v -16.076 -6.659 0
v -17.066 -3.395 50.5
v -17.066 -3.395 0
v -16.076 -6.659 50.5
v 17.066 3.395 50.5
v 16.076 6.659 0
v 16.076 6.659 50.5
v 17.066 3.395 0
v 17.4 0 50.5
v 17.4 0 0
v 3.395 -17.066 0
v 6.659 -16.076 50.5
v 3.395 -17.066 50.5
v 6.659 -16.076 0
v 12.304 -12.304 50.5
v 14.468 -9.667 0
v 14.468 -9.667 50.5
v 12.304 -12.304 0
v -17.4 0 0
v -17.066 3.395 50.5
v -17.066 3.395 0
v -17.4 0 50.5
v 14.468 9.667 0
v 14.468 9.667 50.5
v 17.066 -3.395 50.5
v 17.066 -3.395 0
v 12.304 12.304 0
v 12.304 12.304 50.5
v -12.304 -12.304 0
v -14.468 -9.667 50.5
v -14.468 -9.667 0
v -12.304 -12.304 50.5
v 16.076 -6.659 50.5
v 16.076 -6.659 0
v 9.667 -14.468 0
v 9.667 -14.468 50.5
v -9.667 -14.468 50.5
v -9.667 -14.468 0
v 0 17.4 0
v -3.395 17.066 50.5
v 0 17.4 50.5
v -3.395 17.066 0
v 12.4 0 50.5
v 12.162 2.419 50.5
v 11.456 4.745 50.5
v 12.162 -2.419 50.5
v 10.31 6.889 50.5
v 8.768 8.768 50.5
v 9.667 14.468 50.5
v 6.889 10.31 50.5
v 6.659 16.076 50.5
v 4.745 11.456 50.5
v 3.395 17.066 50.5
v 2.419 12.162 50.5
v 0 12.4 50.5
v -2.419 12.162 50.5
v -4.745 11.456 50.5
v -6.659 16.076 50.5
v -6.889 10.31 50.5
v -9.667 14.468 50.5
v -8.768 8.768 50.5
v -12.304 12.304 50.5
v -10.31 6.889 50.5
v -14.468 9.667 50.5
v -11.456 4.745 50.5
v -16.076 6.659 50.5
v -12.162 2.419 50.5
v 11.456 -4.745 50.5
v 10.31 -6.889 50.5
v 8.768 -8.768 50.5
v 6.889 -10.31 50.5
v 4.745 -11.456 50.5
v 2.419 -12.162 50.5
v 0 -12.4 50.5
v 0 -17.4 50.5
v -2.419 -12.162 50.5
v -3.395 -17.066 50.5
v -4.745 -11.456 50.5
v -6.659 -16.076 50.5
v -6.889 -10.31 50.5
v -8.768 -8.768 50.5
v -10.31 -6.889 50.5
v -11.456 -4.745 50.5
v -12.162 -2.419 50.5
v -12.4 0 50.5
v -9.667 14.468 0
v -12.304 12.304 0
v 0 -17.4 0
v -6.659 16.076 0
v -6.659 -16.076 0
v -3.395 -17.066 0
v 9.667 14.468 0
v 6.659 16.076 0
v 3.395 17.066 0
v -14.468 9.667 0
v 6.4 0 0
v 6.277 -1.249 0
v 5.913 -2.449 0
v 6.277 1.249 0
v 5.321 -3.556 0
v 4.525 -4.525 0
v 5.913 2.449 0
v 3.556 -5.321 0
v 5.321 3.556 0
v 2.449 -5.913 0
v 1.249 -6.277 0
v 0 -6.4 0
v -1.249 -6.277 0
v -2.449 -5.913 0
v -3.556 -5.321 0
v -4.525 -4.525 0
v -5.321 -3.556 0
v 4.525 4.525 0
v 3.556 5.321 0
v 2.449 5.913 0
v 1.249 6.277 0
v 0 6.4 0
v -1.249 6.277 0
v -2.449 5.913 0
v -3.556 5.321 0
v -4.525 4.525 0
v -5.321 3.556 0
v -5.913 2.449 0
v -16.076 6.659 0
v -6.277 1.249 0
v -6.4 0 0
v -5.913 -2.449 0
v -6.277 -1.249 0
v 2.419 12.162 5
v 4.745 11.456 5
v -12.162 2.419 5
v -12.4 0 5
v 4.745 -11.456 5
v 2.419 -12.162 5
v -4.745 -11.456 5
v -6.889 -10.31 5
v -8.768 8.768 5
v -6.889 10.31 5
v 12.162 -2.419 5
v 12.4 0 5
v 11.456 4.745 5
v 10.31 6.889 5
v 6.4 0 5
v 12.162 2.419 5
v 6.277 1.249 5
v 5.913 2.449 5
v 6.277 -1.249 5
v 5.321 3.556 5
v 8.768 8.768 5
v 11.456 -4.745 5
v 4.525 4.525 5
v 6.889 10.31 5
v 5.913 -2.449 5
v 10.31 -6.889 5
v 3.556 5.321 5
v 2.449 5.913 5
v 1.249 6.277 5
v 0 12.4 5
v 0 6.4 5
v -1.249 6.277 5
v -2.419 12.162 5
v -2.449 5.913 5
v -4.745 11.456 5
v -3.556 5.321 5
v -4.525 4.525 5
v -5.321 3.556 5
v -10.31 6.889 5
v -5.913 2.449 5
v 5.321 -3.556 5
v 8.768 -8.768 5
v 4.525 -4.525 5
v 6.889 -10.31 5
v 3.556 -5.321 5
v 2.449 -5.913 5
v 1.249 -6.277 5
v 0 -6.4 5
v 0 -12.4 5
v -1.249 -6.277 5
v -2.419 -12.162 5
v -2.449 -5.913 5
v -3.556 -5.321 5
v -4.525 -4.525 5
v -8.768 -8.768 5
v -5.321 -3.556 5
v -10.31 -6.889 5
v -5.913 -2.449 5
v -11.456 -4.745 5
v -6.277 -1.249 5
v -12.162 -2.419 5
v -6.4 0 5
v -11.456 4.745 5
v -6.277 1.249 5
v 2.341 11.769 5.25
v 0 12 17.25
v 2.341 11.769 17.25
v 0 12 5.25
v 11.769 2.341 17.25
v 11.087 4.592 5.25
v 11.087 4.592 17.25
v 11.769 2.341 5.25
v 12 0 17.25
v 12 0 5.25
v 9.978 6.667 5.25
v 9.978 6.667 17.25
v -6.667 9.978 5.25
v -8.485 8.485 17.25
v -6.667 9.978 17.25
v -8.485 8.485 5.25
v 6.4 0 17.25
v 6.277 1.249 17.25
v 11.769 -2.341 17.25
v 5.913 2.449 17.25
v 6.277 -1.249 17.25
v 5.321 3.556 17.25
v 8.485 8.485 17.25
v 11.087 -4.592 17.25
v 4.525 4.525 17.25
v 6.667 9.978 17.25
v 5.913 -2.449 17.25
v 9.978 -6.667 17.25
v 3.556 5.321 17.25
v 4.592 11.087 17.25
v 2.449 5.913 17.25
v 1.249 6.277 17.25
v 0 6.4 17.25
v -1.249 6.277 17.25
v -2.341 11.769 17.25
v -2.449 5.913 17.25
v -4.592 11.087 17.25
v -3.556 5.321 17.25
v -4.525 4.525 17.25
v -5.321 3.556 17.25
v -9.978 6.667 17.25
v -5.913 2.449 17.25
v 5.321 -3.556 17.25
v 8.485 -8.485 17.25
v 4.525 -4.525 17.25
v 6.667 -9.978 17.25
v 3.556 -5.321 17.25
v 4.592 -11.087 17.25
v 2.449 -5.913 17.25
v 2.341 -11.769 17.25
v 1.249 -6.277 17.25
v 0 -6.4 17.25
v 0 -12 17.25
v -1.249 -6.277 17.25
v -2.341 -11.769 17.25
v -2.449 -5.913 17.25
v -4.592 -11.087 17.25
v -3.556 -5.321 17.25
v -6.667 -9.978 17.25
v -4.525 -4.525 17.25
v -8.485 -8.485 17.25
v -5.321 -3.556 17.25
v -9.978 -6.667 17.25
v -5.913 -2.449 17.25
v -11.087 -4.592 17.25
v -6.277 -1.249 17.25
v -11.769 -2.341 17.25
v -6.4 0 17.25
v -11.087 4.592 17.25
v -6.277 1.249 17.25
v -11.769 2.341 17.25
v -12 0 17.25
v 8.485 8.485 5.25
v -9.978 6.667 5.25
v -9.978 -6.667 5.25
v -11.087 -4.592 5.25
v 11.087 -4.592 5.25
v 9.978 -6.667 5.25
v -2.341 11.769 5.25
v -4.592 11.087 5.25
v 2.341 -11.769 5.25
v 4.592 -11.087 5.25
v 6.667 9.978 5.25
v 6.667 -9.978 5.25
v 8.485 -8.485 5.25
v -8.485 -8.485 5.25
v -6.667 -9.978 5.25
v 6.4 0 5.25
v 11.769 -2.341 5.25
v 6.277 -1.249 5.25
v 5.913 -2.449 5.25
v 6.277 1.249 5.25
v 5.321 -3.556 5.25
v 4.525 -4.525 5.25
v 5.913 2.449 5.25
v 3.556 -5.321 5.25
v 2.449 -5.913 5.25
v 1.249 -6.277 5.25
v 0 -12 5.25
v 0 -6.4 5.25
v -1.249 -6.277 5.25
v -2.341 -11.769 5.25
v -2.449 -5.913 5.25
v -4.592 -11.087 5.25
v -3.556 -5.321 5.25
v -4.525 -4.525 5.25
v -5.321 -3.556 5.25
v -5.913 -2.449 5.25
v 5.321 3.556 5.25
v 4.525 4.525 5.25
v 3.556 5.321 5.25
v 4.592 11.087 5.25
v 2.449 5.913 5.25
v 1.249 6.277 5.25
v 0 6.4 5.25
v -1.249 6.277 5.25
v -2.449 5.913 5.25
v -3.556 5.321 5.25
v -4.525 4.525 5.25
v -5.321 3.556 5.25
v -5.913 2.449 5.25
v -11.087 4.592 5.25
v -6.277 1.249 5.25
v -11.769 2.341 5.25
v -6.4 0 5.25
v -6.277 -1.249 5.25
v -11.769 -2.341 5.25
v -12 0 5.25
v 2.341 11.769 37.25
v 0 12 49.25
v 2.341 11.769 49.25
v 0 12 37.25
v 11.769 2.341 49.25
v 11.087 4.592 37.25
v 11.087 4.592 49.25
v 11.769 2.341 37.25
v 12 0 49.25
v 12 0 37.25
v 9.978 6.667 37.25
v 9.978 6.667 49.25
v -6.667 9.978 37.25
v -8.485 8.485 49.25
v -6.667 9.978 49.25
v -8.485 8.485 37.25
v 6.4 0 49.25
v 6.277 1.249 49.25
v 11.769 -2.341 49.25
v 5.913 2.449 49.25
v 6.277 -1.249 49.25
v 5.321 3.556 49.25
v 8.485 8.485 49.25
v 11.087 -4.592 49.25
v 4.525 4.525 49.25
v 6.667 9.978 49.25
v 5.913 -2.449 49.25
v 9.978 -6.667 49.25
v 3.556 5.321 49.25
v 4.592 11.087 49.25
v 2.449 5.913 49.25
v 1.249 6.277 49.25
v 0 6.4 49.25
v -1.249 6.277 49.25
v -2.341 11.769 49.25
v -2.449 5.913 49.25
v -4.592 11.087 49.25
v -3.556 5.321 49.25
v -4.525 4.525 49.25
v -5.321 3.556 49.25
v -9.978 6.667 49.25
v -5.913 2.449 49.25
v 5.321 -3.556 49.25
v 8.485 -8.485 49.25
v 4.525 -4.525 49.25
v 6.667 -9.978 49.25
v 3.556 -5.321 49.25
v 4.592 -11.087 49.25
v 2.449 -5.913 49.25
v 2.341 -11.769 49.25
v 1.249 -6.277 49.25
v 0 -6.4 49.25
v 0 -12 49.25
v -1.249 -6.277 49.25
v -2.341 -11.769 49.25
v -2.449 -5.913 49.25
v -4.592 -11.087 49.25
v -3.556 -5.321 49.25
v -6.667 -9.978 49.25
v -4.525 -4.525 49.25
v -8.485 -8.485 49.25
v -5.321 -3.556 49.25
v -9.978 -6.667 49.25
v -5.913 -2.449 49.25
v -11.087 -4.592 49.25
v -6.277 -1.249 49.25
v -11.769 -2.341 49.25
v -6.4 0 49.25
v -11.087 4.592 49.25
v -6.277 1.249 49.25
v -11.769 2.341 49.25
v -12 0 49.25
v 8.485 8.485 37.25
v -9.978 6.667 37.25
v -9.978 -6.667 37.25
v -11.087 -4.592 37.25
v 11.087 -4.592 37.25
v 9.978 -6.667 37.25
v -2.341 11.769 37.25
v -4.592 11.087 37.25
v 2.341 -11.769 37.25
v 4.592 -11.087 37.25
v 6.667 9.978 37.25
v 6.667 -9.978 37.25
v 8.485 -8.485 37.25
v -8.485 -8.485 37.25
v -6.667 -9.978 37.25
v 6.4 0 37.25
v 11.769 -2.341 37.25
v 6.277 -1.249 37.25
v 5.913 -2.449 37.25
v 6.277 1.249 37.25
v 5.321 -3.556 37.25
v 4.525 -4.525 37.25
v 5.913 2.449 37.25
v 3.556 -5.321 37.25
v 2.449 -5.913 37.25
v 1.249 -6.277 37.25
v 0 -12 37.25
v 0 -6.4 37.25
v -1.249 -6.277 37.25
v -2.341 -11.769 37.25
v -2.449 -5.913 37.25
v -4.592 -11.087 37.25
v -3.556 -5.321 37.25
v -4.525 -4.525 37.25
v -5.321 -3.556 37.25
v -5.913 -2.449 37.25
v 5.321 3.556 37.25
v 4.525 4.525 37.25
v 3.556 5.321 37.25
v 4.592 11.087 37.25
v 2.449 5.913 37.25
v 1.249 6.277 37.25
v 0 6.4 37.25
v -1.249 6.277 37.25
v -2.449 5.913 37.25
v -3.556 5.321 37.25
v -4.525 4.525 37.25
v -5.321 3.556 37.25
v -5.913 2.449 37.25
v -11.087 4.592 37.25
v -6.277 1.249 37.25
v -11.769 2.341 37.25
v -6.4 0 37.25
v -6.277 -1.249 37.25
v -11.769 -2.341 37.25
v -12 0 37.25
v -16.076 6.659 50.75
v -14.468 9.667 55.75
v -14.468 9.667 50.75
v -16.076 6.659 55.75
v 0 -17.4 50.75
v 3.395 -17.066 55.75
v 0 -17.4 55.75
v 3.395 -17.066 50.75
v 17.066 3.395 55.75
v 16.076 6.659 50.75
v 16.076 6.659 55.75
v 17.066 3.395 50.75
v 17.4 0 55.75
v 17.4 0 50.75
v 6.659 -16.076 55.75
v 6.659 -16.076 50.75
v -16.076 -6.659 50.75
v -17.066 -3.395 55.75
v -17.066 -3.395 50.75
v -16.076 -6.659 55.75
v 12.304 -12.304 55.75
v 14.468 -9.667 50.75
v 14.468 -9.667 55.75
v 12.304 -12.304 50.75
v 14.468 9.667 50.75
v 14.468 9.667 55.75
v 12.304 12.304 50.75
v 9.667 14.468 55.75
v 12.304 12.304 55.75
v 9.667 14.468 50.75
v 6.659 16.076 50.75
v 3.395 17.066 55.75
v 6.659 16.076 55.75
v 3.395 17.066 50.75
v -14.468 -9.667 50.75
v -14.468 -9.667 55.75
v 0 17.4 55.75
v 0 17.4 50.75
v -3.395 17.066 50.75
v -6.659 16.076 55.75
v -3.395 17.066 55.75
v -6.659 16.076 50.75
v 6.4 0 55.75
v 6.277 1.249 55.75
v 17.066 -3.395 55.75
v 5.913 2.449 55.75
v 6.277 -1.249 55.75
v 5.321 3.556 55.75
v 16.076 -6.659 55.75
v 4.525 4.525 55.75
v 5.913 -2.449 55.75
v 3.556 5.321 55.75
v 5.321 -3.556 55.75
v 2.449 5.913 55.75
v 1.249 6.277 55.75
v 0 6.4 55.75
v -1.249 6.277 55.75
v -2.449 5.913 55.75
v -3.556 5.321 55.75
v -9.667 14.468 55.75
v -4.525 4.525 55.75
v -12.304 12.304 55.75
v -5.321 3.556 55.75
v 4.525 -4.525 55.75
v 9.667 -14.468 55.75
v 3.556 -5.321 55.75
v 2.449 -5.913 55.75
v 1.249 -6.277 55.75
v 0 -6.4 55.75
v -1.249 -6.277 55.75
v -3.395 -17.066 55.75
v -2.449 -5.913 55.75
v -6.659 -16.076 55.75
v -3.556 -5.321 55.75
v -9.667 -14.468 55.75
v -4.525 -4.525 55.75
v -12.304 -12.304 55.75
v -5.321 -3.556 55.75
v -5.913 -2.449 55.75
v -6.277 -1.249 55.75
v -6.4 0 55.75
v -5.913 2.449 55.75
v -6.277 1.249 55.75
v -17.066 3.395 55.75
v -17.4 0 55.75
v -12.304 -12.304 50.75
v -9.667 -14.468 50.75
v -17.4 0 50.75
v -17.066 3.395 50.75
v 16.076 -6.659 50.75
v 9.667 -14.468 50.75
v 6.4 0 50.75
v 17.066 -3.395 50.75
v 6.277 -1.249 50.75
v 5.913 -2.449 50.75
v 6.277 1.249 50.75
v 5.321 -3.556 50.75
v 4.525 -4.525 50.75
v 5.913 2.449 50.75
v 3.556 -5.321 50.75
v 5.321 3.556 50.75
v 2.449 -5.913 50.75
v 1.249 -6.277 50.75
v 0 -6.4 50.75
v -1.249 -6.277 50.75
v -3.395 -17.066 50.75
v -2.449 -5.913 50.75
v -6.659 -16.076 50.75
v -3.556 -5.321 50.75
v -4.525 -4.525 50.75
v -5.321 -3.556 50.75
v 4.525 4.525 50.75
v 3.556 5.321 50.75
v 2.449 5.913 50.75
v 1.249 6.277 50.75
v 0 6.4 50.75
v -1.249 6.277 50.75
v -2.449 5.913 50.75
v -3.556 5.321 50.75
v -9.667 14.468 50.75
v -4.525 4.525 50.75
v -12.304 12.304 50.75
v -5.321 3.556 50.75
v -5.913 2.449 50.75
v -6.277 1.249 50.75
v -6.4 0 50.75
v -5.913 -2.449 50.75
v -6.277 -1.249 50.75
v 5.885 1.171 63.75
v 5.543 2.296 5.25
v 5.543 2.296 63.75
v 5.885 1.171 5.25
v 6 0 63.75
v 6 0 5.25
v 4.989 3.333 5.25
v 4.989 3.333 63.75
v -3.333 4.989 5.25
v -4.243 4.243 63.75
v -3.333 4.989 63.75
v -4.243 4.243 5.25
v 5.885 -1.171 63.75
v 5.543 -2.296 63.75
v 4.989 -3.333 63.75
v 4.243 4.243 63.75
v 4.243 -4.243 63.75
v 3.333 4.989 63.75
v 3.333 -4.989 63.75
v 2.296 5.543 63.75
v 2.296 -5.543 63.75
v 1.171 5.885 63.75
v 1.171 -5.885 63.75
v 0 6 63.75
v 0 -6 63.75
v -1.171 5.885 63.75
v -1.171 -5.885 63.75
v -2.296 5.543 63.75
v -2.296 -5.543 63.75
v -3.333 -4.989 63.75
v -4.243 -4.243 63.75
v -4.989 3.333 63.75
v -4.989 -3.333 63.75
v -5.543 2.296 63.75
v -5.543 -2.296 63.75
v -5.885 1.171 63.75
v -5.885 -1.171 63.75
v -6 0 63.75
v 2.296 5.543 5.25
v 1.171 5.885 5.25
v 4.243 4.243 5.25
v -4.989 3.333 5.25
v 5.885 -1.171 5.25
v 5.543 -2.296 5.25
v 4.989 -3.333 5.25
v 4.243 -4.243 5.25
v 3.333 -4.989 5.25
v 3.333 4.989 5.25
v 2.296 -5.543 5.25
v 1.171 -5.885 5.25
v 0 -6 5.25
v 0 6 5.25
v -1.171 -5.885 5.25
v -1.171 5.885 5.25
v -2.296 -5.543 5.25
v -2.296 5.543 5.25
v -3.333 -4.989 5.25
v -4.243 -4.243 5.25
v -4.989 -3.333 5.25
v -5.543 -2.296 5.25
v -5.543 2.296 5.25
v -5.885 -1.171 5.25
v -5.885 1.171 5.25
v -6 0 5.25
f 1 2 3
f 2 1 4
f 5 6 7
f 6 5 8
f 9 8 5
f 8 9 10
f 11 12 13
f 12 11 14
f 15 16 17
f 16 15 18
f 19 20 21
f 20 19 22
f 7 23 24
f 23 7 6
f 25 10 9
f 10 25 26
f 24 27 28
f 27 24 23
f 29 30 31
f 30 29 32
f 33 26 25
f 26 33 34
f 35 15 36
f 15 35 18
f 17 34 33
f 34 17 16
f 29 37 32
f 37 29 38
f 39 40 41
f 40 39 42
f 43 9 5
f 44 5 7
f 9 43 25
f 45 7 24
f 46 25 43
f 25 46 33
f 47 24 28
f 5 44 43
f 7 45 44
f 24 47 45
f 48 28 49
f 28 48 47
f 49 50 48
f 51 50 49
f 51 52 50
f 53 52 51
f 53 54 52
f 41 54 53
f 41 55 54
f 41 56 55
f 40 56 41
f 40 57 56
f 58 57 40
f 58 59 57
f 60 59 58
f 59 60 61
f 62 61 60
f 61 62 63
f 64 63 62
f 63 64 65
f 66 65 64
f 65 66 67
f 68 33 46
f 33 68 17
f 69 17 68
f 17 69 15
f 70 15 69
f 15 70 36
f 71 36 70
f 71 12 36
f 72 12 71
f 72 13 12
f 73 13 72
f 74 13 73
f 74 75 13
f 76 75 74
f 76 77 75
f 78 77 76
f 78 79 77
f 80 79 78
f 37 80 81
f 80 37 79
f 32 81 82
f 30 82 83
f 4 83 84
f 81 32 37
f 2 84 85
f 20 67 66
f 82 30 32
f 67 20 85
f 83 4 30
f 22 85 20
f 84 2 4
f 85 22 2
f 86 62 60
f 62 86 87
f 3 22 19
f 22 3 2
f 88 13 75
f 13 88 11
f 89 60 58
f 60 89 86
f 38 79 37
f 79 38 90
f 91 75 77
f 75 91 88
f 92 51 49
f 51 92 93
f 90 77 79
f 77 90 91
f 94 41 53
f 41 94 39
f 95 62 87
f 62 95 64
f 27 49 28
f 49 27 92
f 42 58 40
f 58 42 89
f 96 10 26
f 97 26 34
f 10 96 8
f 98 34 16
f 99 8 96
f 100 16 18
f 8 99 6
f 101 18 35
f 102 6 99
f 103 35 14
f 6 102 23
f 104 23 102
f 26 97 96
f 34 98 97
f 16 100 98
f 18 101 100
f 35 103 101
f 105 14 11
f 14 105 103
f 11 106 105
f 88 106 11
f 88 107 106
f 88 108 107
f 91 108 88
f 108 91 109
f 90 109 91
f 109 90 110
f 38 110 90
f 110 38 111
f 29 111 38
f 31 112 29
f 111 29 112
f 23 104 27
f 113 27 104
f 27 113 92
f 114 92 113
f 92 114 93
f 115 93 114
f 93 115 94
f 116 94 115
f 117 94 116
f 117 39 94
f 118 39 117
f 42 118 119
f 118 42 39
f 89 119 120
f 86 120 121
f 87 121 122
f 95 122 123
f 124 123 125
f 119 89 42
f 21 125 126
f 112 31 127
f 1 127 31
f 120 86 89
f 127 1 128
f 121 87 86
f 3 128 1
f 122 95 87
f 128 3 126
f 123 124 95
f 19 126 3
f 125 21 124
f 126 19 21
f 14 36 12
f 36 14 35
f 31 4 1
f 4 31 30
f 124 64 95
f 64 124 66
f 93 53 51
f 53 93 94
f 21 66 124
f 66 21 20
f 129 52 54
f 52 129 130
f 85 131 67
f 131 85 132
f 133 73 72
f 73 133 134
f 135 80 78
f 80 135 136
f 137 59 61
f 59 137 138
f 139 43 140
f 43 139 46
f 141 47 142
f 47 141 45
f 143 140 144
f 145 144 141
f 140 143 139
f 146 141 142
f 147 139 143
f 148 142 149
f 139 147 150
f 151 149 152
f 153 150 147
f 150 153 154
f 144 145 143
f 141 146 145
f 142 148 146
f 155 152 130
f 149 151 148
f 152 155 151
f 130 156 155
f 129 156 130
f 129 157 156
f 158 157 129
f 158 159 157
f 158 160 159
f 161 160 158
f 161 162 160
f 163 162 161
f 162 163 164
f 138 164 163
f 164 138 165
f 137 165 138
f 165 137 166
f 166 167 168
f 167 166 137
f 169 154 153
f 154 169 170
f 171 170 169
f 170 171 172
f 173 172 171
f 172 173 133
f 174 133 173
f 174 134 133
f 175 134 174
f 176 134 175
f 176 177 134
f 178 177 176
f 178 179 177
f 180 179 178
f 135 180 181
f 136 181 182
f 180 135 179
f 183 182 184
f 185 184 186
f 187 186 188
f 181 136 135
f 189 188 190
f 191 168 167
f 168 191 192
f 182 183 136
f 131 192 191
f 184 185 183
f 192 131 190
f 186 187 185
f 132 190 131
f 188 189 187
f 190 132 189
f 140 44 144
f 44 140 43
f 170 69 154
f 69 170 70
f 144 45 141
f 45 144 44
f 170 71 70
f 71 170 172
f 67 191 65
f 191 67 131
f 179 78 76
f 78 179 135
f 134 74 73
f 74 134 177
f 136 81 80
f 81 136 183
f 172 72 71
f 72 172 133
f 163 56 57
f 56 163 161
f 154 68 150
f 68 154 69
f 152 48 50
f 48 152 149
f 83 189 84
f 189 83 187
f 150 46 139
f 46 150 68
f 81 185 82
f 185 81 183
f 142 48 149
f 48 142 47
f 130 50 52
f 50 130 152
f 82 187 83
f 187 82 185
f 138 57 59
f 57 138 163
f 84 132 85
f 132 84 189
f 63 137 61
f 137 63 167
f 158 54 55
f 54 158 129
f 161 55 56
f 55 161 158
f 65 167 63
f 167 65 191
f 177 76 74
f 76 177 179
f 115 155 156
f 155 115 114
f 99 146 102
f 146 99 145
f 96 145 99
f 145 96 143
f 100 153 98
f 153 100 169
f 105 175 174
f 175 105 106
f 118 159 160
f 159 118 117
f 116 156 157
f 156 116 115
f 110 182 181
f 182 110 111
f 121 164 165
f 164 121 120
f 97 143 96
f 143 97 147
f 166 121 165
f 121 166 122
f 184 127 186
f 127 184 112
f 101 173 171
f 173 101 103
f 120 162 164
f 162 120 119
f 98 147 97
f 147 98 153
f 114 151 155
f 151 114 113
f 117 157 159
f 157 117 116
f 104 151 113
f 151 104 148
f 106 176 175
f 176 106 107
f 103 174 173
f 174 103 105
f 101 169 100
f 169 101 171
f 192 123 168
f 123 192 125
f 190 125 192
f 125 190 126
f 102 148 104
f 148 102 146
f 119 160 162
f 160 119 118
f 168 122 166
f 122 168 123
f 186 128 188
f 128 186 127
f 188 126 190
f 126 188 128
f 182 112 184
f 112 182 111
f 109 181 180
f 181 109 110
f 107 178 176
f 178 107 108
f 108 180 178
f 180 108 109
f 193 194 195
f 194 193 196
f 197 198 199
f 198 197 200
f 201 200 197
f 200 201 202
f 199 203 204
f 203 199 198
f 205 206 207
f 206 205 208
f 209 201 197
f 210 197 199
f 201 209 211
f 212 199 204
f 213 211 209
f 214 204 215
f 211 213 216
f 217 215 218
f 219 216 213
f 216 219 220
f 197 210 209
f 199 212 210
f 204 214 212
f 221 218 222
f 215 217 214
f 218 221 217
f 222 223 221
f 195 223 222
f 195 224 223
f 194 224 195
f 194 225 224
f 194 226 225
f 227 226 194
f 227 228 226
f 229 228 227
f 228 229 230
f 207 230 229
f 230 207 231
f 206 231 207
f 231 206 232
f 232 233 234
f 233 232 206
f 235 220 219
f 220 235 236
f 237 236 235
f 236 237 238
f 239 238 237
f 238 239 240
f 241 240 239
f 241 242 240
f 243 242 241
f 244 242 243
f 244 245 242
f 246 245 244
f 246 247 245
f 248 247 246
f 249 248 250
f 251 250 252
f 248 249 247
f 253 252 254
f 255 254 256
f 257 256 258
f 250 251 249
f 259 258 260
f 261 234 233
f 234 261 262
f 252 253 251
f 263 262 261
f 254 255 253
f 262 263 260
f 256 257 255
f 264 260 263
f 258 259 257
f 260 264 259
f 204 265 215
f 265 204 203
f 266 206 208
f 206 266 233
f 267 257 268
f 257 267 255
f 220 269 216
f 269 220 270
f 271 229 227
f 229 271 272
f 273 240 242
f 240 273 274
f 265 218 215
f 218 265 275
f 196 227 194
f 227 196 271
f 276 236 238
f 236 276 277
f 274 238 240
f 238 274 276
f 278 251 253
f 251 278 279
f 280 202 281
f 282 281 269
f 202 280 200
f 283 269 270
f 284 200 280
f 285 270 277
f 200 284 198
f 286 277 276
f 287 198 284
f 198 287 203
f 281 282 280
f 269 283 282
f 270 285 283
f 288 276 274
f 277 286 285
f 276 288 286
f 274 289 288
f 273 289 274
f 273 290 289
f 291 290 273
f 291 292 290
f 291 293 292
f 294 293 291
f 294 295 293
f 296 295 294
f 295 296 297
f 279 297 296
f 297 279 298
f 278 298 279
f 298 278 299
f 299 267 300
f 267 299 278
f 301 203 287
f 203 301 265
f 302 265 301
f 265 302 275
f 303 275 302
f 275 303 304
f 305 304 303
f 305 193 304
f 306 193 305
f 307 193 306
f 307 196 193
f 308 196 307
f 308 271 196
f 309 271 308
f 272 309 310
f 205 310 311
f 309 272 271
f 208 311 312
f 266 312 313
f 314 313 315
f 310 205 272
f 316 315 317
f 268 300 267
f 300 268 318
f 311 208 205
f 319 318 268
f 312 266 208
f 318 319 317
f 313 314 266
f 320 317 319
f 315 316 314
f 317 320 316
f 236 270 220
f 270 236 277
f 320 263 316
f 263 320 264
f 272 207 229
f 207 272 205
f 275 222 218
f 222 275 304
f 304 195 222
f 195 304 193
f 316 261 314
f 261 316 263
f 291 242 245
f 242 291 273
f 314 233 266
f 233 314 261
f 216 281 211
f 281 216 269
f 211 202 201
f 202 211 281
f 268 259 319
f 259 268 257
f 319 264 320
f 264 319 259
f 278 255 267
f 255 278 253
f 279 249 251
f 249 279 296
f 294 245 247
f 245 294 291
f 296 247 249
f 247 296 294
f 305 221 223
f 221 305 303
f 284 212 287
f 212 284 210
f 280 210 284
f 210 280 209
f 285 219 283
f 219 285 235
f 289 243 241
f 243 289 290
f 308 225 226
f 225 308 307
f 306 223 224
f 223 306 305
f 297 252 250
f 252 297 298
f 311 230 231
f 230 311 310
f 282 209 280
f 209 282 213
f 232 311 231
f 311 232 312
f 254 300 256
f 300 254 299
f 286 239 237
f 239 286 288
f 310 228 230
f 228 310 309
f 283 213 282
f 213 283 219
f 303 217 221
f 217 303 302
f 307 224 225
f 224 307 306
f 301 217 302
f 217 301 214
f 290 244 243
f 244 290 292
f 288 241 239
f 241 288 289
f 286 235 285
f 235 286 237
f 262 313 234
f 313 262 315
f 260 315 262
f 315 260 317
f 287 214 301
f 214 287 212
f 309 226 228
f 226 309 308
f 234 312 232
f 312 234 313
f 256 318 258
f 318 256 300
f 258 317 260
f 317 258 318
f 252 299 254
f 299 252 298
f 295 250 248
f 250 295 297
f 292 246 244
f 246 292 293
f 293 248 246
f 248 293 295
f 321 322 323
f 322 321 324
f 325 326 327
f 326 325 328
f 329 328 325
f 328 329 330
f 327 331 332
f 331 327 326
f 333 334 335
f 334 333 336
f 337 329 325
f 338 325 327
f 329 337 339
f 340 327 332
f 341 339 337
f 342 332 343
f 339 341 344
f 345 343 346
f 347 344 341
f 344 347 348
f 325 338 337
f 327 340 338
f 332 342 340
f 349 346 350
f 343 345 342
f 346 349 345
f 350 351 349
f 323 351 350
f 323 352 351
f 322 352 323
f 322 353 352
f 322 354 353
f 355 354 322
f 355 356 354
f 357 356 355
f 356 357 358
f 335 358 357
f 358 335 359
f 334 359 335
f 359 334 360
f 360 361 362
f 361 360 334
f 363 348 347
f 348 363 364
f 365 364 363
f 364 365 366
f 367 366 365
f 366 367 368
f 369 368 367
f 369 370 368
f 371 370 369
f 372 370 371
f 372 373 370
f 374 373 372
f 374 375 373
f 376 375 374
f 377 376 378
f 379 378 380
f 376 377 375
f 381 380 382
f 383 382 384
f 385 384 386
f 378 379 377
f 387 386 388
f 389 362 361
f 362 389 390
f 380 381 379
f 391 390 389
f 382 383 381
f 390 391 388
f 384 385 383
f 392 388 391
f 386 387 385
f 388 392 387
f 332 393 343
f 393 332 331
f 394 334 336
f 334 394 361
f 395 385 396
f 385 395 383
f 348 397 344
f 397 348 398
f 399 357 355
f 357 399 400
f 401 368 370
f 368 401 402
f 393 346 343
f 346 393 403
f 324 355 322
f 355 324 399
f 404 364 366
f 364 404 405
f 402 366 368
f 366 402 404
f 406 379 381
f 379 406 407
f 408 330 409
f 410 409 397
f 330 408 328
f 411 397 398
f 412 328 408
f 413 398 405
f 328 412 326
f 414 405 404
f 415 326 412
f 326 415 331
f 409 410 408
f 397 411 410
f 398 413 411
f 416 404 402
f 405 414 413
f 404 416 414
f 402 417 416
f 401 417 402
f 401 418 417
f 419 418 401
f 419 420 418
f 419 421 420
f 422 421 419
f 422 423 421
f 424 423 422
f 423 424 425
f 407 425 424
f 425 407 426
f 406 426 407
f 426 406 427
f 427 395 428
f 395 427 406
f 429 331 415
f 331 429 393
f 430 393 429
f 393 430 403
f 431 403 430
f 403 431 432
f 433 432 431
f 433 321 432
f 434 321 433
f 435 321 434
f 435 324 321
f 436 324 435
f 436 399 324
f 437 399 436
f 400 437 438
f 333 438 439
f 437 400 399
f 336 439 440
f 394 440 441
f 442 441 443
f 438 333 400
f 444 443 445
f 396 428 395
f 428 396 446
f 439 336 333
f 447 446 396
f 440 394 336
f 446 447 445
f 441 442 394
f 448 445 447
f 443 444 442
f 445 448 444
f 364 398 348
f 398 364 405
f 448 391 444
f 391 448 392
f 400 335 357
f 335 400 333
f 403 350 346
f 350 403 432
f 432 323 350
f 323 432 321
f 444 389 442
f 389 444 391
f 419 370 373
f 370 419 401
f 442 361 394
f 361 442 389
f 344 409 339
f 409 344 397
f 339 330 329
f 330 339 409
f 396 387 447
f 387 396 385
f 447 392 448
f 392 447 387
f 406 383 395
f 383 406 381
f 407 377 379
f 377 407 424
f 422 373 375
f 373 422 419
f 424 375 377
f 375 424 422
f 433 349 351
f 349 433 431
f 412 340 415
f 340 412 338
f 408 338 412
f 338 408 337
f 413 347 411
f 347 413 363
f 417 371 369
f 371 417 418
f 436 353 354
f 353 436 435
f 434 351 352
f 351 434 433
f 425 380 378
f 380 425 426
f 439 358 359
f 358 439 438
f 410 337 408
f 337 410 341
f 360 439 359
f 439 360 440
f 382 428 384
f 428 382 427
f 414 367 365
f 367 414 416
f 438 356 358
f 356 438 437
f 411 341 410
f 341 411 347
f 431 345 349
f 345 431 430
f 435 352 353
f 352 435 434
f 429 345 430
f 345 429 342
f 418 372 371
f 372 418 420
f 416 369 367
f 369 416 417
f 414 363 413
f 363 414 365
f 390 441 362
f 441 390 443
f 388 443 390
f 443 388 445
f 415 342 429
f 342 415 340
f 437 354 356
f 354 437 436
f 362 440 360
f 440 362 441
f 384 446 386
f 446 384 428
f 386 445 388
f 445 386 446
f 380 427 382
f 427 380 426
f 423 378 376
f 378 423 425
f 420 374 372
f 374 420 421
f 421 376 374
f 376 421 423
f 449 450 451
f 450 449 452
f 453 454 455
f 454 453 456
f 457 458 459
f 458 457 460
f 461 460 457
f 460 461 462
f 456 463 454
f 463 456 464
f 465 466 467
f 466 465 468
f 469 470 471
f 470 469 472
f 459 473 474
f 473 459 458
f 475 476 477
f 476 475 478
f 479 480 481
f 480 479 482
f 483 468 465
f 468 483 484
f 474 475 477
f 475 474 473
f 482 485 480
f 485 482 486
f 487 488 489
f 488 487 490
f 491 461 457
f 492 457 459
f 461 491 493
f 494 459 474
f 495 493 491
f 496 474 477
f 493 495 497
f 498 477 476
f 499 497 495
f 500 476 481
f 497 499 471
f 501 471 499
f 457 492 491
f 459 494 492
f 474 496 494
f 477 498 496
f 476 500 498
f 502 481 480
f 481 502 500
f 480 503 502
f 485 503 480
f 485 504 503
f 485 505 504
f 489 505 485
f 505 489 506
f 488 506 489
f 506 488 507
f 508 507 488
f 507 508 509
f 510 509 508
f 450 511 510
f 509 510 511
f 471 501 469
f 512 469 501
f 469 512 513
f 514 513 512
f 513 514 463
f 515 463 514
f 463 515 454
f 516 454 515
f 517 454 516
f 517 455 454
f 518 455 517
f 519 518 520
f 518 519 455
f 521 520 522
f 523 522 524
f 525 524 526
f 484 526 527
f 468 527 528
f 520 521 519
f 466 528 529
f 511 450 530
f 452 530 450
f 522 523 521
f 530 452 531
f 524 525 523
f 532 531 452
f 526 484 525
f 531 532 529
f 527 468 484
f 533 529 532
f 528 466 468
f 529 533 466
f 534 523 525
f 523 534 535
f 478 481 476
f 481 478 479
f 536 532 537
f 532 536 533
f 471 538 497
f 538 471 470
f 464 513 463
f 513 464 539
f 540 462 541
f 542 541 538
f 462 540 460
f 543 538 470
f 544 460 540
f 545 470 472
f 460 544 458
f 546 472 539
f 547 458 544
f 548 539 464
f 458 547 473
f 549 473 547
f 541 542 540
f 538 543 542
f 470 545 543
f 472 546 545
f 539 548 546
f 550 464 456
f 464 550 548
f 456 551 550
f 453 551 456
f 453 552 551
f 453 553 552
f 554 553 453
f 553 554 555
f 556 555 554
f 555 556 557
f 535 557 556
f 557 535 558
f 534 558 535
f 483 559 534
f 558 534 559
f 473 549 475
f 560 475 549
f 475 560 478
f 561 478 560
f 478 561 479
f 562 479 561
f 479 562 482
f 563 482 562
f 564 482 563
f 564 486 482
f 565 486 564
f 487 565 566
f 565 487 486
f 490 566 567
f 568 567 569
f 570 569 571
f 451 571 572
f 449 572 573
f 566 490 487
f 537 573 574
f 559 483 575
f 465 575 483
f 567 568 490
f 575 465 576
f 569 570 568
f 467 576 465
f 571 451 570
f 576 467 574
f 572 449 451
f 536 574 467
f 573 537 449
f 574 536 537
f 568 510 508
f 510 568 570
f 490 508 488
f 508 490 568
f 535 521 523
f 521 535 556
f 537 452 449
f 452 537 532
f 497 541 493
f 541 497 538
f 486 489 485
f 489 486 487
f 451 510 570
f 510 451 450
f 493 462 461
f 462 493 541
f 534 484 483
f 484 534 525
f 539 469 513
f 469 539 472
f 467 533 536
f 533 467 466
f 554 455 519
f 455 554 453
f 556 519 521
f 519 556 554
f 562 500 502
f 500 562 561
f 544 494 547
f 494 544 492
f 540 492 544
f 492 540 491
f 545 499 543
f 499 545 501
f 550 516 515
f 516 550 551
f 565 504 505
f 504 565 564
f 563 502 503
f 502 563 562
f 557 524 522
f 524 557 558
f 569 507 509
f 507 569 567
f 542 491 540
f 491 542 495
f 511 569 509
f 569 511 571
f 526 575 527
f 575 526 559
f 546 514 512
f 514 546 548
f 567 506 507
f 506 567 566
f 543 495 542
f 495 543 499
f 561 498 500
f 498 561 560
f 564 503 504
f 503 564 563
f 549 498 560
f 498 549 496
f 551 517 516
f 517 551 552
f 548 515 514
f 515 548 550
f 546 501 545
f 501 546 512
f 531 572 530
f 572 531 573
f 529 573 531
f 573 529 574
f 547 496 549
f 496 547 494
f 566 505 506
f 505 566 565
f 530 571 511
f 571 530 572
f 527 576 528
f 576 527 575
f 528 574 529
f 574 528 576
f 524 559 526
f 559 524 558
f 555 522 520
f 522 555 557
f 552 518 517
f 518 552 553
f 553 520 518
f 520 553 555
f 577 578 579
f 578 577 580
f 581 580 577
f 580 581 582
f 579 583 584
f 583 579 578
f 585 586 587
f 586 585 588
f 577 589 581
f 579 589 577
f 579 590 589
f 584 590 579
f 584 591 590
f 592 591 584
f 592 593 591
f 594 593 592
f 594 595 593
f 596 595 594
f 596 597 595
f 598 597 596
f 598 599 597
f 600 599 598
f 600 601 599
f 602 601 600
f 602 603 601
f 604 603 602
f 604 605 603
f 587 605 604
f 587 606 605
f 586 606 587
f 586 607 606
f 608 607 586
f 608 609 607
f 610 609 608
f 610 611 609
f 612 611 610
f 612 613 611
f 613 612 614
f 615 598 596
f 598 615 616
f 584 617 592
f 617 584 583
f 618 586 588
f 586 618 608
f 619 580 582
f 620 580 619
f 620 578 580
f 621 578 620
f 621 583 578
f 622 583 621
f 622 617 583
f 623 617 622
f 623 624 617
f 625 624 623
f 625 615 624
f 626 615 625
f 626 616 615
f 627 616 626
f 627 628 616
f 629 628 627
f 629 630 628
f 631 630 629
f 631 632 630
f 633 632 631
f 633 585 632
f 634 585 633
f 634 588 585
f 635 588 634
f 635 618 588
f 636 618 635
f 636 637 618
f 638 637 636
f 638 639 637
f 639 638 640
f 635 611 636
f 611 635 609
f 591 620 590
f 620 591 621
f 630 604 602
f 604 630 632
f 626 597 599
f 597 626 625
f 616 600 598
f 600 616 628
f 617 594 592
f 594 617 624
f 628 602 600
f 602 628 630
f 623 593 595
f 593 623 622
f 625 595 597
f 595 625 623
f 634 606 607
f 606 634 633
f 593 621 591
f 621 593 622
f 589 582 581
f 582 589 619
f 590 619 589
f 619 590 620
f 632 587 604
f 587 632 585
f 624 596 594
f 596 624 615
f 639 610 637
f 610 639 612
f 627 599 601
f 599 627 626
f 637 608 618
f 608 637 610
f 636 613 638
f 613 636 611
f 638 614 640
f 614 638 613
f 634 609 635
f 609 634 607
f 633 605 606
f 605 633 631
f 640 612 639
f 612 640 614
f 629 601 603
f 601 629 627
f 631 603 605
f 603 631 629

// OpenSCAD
$fn = 32;

// ------------------------------------------------------------------------
// Shaft station: cup d34.8 x 50.5 mm, shaft d12
// Every part is its own module, assembly() places every instance.
// ------------------------------------------------------------------------

// --- part 1 ---
module housing_cup() {
  difference() {
    cylinder(h = 50.5, d = 34.8);
    translate([0, 0, 5]) cylinder(h = 46.5, d = 24.8);
    translate([0, 0, -1]) cylinder(h = 7, d = 12.8);
  }
}

// --- part 2 ---
module bearing_lower() {
  difference() {
      translate([0, 0, 0]) cylinder(h = 12, d = 24);
      translate([0, 0, -1]) cylinder(h = 14, d = 12.8);
    }
}

// --- part 3 ---
module bearing_upper() {
  difference() {
      translate([0, 0, 0]) cylinder(h = 12, d = 24);
      translate([0, 0, -1]) cylinder(h = 14, d = 12.8);
    }
}

// --- part 4 ---
module station_shaft() {
  translate([0, 0, -29.25]) cylinder(h = 58.5, d = 12);
}

// --- part 5 ---
module station_cover() {
  difference() {
    cylinder(h = 5, d = 34.8);
    translate([0, 0, -1]) cylinder(h = 7, d = 12.8);
  }
}

// --- assembly ---
module assembly() {
  color([0.80, 0.24, 0.20]) translate([0, 0, 0]) rotate([0, 0, 0]) housing_cup();
  color([0.20, 0.45, 0.75]) translate([0, 0, 5.25]) rotate([0, 0, 0]) bearing_lower();
  color([0.25, 0.62, 0.32]) translate([0, 0, 37.25]) rotate([0, 0, 0]) bearing_upper();
  color([0.92, 0.70, 0.18]) translate([0, 0, 34.5]) rotate([0, 0, 0]) station_shaft();
  color([0.58, 0.35, 0.70]) translate([0, 0, 50.75]) rotate([0, 0, 0]) station_cover();
}

assembly();
